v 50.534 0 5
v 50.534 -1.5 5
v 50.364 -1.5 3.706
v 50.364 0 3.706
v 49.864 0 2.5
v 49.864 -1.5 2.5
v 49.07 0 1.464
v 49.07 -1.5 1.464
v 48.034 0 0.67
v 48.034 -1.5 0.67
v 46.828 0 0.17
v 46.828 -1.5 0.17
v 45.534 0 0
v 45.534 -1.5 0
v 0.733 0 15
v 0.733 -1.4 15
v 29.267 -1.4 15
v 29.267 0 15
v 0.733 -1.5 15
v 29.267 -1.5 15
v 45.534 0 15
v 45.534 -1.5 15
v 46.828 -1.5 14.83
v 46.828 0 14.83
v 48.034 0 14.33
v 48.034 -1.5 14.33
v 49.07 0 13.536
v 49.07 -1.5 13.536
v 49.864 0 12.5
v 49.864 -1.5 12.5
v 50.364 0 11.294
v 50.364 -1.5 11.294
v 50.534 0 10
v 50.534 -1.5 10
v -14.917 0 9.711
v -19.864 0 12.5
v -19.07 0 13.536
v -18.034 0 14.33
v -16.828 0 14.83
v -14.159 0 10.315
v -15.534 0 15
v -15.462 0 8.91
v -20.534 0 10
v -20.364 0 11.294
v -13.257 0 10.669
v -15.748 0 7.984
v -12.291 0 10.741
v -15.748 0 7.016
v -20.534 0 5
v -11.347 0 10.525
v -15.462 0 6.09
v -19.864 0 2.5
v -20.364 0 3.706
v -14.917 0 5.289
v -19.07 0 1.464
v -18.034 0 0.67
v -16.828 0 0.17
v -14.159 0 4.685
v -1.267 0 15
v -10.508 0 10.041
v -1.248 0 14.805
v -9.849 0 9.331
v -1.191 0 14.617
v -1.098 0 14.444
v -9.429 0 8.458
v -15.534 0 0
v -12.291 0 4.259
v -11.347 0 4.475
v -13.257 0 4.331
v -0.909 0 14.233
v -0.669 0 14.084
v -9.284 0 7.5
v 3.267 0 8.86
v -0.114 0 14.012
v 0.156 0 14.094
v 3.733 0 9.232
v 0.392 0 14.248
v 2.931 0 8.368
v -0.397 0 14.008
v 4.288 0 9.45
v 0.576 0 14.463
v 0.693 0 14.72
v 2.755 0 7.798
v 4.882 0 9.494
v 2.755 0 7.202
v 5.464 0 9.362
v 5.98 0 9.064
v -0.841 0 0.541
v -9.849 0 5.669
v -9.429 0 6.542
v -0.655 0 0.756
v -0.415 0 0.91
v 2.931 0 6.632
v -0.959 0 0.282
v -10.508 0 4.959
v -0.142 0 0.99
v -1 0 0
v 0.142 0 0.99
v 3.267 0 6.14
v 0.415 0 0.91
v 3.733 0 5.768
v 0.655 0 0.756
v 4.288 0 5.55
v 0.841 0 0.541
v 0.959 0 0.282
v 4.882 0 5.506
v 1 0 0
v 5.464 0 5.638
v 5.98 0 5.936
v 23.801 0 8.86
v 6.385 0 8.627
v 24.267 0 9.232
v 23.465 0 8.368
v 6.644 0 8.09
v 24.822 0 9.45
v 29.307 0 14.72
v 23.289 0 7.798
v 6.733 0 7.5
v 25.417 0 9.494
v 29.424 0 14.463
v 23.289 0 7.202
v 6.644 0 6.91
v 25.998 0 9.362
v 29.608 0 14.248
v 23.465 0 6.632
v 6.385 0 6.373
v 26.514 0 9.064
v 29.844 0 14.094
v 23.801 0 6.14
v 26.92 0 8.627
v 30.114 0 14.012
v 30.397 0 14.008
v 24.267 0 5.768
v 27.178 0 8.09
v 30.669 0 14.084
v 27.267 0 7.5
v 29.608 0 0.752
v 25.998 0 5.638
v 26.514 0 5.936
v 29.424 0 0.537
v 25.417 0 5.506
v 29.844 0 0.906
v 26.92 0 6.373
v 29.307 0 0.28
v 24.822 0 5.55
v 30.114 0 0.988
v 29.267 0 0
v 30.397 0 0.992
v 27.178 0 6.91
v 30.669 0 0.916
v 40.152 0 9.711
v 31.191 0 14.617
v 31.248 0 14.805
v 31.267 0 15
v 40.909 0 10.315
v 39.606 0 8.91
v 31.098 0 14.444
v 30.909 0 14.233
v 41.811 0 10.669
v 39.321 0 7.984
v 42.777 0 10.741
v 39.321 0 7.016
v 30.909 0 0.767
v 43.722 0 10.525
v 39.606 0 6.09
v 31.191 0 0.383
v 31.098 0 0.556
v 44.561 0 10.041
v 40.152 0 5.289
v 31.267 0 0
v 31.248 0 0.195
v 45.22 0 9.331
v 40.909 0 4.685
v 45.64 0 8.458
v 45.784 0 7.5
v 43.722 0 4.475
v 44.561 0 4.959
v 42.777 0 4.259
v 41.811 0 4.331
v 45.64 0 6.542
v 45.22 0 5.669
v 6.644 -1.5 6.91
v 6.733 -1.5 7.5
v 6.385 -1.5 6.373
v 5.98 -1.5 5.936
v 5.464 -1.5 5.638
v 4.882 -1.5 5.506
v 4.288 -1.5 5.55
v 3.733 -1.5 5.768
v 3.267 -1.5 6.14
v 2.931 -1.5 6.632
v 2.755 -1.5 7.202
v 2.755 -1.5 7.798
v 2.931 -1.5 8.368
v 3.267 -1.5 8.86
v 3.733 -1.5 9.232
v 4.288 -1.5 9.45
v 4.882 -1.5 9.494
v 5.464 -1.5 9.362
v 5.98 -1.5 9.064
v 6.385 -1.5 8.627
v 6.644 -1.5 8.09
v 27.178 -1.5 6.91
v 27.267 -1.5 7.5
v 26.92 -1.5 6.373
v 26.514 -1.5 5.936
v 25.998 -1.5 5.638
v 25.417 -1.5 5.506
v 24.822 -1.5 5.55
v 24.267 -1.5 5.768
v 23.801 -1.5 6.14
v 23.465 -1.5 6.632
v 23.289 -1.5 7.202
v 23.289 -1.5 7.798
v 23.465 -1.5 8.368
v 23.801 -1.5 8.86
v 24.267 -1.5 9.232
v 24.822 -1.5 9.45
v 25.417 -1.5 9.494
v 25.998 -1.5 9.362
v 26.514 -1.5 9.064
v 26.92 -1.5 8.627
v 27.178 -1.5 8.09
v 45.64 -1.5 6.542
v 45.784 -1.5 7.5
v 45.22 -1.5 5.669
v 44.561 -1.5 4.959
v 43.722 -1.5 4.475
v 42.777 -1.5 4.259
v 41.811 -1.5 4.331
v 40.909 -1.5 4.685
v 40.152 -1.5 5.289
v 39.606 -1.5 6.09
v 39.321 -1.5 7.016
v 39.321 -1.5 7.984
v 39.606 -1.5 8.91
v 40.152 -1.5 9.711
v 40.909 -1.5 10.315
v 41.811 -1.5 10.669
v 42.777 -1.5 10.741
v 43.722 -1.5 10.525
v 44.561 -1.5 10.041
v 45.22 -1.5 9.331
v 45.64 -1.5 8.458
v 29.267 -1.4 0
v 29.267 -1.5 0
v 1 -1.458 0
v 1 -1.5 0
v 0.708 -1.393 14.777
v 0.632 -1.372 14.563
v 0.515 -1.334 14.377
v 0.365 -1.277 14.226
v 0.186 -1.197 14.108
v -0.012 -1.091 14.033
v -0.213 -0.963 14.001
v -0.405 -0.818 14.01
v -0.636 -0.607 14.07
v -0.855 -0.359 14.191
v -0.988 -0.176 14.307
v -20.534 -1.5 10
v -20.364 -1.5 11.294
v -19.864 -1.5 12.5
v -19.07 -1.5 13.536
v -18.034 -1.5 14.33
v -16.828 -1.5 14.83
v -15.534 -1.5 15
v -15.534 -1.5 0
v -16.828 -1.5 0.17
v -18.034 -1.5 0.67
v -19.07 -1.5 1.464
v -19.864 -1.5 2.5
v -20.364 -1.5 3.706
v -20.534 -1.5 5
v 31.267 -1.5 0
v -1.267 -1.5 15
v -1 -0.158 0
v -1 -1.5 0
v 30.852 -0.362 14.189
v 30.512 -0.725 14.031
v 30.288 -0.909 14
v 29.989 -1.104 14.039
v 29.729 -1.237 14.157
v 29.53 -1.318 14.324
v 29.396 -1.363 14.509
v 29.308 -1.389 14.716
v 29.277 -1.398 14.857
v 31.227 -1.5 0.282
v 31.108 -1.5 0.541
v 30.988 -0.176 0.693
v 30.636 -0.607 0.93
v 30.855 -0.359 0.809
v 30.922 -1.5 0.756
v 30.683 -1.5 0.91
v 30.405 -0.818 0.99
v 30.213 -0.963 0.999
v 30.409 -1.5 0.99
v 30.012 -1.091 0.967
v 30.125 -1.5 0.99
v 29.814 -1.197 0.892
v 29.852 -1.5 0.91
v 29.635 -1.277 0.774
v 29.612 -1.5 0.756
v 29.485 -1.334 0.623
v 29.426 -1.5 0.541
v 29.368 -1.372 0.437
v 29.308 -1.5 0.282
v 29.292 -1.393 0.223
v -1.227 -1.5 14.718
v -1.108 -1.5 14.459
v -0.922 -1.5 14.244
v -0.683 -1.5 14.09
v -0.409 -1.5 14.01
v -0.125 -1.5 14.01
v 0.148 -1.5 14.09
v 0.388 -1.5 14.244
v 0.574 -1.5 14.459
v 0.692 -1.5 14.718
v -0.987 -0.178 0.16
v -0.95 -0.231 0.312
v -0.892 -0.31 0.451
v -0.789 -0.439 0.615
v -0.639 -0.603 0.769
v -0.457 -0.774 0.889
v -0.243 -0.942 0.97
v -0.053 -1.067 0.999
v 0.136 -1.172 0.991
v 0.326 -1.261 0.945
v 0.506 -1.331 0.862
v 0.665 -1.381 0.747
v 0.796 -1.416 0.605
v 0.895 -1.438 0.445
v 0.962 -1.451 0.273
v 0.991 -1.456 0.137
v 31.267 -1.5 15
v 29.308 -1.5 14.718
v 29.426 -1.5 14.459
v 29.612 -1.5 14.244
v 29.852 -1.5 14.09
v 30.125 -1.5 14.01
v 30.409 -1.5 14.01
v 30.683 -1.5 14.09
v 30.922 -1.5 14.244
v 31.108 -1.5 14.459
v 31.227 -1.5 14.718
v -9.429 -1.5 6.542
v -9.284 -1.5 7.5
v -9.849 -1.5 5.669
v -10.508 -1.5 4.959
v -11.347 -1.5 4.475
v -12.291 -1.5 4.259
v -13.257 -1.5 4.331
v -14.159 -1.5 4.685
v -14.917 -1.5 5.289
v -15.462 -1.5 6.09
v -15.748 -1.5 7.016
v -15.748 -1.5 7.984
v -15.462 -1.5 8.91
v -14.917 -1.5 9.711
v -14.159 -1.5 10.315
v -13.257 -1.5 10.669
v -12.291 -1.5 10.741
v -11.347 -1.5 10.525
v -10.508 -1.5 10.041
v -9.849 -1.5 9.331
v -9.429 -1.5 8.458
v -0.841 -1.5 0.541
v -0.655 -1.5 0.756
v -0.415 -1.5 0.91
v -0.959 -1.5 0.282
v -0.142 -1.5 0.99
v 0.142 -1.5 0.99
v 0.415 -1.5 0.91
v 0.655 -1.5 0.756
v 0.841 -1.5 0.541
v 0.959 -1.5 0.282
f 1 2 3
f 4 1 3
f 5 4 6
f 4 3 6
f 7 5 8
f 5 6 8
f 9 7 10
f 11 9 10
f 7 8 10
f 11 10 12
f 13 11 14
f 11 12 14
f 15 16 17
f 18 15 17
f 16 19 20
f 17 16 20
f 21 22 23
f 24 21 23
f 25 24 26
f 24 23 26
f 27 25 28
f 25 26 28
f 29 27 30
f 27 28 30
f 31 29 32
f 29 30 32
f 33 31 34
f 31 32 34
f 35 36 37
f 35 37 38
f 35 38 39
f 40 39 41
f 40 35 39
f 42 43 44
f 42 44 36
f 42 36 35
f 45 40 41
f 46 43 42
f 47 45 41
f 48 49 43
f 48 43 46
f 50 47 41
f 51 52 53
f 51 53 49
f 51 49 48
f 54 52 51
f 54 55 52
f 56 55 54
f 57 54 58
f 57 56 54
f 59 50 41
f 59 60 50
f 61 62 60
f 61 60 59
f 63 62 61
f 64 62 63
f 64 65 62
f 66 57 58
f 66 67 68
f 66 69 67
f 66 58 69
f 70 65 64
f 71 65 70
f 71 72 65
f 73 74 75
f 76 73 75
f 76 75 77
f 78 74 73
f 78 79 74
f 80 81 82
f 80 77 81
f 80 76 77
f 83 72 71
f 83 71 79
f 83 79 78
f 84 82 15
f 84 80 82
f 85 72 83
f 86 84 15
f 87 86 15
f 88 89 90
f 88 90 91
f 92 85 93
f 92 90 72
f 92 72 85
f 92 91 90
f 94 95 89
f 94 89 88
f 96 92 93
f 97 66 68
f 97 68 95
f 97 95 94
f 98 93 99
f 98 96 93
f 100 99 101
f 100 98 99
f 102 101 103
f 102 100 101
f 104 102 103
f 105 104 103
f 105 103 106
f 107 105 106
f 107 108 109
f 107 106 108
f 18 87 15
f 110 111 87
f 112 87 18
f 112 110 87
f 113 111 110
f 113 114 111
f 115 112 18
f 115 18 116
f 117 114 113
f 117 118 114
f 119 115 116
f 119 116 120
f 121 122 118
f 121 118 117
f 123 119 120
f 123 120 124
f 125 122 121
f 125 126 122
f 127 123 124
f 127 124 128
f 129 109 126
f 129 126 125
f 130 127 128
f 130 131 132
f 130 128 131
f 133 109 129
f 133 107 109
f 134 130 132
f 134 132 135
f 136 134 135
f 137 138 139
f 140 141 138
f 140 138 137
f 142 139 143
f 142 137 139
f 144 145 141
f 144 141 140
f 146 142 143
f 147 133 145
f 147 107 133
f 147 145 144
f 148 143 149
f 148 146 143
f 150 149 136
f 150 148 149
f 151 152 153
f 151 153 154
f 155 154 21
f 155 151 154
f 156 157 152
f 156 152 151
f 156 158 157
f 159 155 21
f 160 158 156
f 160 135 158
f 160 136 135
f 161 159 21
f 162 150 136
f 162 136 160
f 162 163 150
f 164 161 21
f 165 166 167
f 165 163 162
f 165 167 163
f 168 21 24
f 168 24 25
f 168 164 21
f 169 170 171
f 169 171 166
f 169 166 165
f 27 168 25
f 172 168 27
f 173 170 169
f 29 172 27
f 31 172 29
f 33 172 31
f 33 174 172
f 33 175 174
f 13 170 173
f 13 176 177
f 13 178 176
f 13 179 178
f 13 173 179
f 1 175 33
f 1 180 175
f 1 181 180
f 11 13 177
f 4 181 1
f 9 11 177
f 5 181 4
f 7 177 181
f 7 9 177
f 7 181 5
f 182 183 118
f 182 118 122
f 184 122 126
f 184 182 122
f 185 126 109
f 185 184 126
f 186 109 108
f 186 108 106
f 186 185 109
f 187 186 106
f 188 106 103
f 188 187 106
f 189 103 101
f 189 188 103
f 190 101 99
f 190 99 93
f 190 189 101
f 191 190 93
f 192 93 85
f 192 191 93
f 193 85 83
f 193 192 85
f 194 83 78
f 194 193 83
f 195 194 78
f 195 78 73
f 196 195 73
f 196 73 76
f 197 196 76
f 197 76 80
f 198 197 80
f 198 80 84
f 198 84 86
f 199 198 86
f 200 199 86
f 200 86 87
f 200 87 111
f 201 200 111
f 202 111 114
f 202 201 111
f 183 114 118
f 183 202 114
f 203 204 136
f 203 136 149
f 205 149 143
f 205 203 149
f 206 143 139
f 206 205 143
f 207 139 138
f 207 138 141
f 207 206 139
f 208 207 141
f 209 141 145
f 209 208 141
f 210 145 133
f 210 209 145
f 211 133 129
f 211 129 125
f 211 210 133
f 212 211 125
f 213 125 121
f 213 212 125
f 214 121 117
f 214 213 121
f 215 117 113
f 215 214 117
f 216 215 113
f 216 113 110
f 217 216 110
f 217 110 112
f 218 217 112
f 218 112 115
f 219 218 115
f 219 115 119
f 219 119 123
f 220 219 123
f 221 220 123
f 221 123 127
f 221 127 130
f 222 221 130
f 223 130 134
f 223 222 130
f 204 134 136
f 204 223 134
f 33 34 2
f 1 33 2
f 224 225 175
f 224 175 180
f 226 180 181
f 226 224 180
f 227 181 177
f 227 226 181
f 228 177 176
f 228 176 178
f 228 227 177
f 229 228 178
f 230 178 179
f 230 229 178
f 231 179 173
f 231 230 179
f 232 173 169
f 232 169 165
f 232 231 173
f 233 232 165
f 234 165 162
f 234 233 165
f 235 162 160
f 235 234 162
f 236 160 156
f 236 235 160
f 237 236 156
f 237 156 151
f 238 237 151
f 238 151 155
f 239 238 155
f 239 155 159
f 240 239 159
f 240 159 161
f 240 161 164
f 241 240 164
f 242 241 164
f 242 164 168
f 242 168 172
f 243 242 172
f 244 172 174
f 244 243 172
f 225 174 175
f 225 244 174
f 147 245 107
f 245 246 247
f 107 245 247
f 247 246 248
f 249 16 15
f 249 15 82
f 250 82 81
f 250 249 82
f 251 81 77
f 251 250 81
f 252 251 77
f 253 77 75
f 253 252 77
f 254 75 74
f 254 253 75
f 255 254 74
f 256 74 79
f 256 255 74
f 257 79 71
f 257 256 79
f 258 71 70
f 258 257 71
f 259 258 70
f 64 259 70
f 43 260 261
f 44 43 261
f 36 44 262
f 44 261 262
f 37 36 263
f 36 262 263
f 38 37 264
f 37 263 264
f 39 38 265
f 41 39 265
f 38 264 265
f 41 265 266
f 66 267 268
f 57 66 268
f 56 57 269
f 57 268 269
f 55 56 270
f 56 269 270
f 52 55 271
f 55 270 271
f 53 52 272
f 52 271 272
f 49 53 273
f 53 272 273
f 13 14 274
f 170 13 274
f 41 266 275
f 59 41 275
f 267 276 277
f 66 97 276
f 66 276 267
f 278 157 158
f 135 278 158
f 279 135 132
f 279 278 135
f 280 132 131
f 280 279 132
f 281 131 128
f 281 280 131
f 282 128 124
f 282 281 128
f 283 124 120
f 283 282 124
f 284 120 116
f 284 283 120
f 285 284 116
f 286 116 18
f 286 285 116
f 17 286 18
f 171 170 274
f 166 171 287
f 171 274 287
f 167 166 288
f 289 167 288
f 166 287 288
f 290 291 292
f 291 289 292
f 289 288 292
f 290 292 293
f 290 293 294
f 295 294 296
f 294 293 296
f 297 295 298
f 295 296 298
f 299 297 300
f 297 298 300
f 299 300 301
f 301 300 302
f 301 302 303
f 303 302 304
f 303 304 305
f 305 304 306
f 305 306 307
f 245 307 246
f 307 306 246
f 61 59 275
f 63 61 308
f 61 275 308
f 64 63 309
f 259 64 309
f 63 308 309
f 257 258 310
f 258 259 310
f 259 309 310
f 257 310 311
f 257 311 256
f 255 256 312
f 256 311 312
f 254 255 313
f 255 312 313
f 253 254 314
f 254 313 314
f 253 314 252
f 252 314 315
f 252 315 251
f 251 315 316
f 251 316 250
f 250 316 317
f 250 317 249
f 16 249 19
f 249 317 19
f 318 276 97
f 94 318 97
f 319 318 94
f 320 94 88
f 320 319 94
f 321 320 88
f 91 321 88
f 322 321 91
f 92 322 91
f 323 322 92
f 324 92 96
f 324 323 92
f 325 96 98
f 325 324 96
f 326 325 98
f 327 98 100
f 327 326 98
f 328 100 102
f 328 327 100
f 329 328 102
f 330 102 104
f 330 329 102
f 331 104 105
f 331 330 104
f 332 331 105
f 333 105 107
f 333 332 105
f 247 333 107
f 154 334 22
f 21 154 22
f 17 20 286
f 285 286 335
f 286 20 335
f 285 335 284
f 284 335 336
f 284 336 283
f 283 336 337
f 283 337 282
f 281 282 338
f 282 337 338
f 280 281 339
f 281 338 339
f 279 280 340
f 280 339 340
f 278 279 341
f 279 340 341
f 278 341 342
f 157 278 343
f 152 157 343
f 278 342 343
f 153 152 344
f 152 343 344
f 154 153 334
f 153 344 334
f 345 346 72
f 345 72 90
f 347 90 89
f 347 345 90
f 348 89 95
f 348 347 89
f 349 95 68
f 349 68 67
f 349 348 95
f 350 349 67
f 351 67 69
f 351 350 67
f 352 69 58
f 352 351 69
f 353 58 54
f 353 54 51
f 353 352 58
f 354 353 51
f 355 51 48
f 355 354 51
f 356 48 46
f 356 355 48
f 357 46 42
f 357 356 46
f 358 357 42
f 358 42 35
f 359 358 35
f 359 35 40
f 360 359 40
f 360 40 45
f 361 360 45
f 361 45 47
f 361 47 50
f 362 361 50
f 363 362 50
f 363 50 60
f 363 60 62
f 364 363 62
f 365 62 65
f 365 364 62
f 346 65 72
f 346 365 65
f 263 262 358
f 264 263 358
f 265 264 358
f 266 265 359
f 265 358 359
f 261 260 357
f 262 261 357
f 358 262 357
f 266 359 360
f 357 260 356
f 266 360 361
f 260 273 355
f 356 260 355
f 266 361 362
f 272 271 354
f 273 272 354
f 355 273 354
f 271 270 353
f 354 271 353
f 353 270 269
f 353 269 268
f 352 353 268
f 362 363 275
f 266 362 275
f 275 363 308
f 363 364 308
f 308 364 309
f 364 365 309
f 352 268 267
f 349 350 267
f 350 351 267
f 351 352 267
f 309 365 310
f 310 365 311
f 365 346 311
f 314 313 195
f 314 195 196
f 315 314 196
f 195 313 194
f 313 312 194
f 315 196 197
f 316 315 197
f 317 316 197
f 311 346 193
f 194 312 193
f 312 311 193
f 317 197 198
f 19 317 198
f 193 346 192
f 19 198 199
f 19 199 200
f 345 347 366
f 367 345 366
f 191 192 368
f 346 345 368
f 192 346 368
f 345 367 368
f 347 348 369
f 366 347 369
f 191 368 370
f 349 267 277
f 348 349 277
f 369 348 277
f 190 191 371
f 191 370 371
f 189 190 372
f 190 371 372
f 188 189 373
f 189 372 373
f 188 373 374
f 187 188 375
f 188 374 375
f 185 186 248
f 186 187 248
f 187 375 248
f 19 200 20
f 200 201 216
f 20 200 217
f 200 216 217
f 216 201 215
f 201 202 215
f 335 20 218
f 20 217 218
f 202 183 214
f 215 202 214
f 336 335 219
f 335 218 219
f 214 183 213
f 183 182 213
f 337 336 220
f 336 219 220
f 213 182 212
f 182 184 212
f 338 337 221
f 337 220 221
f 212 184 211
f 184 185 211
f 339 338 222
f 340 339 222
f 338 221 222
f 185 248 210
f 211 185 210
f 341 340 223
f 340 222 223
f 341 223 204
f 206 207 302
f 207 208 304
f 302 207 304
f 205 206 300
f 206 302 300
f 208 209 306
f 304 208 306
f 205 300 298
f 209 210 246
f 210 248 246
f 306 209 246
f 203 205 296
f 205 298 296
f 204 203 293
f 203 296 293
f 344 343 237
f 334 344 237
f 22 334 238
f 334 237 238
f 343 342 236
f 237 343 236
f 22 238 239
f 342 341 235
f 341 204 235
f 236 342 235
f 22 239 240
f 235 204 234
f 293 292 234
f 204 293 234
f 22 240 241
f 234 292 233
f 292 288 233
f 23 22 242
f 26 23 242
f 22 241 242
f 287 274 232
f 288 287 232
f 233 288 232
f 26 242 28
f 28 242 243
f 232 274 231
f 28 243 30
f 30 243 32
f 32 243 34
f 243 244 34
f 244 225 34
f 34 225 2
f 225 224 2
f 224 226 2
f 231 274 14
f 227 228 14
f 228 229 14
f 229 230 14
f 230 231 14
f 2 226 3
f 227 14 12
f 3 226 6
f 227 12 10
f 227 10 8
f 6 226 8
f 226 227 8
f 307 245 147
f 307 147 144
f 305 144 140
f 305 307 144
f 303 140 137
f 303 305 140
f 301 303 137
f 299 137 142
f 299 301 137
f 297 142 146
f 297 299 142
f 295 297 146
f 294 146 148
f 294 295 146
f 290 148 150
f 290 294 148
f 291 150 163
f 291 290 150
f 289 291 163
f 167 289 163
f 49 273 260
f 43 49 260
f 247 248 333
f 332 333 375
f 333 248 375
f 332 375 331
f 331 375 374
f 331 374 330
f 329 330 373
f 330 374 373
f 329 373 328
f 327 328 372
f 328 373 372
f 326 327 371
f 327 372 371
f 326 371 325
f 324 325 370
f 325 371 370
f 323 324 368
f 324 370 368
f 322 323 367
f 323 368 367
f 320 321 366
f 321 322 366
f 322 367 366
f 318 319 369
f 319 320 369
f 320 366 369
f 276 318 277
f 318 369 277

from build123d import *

# Parameters (mm, degrees)
SM_BASE_FLANGE_2_DEPTH      = 15
SKETCH_26_R                 = 3.25
CUT_EXTRUDE_1_DEPTH         = 42.400483089
FILLET_1_R                  = 5
CUT_EXTRUDE_2_OUTLINE_W     = 33
CUT_EXTRUDE_2_OUTLINE_H     = 15
CUT_EXTRUDE_2_OUTLINE_R     = 2
CUT_EXTRUDE_2_DEPTH         = 20
CUT_EXTRUDE_START           = -1.5
CUT_EXTRUDE_2_2_OUTLINE_R   = 2
CUT_EXTRUDE_2_2_DEPTH       = 1.5
CUT_EXTRUDE_2_3_OUTLINE_R   = 2
CUT_EXTRUDE_2_3_OUTLINE_R_2 = 3.25
CUT_EXTRUDE_2_3_DEPTH       = 1.5


# Read off the part's stored shape, not the designer's step: Вырез-Вытянуть2
# Sheet-metal steps are written as plain solids
with BuildPart() as part:
    # Эскиз1 → Базовая кромка2 (new body)
    with BuildSketch(Plane.XY):
        with BuildLine():
            Line((0, 20), (0, 1.5))
            ThreePointArc((0, 1.5), (0.439339828, 0.439339828), (1.5, 0))
            Line((1.5, 0), (28.5, 0))
            ThreePointArc((28.5, 0), (29.560660172, 0.439339828), (30, 1.5))
            Line((30, 1.5), (30, 20))
            Line((30, 20), (31.5, 20))
            Line((31.5, 20), (31.5, 1.5))
            ThreePointArc((31.5, 1.5), (30.621320344, -0.621320344), (28.5, -1.5))
            Line((28.5, -1.5), (1.5, -1.5))
            ThreePointArc((1.5, -1.5), (-0.621320344, -0.621320344), (-1.5, 1.5))
            Line((-1.5, 1.5), (-1.5, 20))
            Line((-1.5, 20), (0, 20))
        make_face()
    extrude(amount=SM_BASE_FLANGE_2_DEPTH)

    # Эскиз26 → Вырез-Вытянуть1 (cut, through all)
    with BuildSketch(Plane(origin=(31.5, 0, 0), x_dir=(0, 0, -1), z_dir=(1, 0, 0))):
        with Locations((-7.5, 12)):
            Circle(SKETCH_26_R)
    extrude(amount=-CUT_EXTRUDE_1_DEPTH, mode=Mode.SUBTRACT)

    # Скругление1
    fillet_1_edges = [part.edges().sort_by_distance(p)[0] for p in [
        (-0.75, 20, 0),
        (30.75, 20, 0),
        (-0.75, 20, 15),
        (30.75, 20, 15),
    ]]
    fillet(fillet_1_edges, radius=FILLET_1_R)

    # Вырез-Вытянуть2 outline → Вырез-Вытянуть2 (cut)
    with BuildSketch(Plane(origin=(0, 0, 0), x_dir=(1, 0, 0), z_dir=(0, 1, 0))):
        with Locations((15, -7.5)):
            Rectangle(CUT_EXTRUDE_2_OUTLINE_W, CUT_EXTRUDE_2_OUTLINE_H)
        with Locations((25.267145868, -7.5)):
            Circle(CUT_EXTRUDE_2_OUTLINE_R, mode=Mode.SUBTRACT)
        with Locations((4.732854132, -7.5)):
            Circle(CUT_EXTRUDE_2_OUTLINE_R, mode=Mode.SUBTRACT)
    extrude(amount=CUT_EXTRUDE_2_DEPTH, mode=Mode.SUBTRACT)

    # Cut-Extrude 2 2 outline → Cut-Extrude 2 2 (cut)
    with BuildSketch(Plane(origin=(0, 0, 0), x_dir=(1, 0, 0), z_dir=(0, 1, 0)).offset(CUT_EXTRUDE_START)):
        with BuildLine():
            ThreePointArc((31.267145868, -15), (30.267145868, -14), (29.267145868, -15))
            Line((29.267145868, -15), (31.267145868, -15))
        make_face()
        with BuildLine():
            Line((31.267145868, 0), (29.267145868, 0))
            ThreePointArc((29.267145868, 0), (30.267145868, -1), (31.267145868, 0))
        make_face()
        with BuildLine():
            ThreePointArc((0.732854132, -15), (-0.267145868, -14), (-1.267145868, -15))
            Line((-1.267145868, -15), (0.732854132, -15))
        make_face()
        with BuildLine():
            Line((1, 0), (-1, 0))
            ThreePointArc((-1, 0), (0, -1), (1, 0))
        make_face()
        with Locations((25.267145868, -7.5)):
            Circle(CUT_EXTRUDE_2_2_OUTLINE_R)
        with Locations((4.732854132, -7.5)):
            Circle(CUT_EXTRUDE_2_2_OUTLINE_R)
    extrude(amount=CUT_EXTRUDE_2_2_DEPTH, mode=Mode.SUBTRACT)

    # Cut-Extrude 2 3 outline → Cut-Extrude 2 3 (add)
    with BuildSketch(Plane(origin=(0, 0, 0), x_dir=(1, 0, 0), z_dir=(0, 1, 0)).offset(CUT_EXTRUDE_START)):
        with BuildLine():
            Line((31.267145868, -15), (45.534291735, -15))
            ThreePointArc((45.534291735, -15), (49.069825641, -13.535533906), (50.534291735, -10))
            Line((50.534291735, -10), (50.534291735, -5))
            ThreePointArc((50.534291735, -5), (49.069825641, -1.464466094), (45.534291735, 0))
            Line((45.534291735, 0), (31.267145868, 0))
            ThreePointArc((31.267145868, 0), (30.267145868, -1), (29.267145868, 0))
            Line((29.267145868, 0), (1, 0))
            ThreePointArc((1, 0), (0, -1), (-1, 0))
            Line((-1, 0), (-15.534291735, 0))
            ThreePointArc((-15.534291735, 0), (-19.069825641, -1.464466094), (-20.534291735, -5))
            Line((-20.534291735, -5), (-20.534291735, -10))
            ThreePointArc((-20.534291735, -10), (-19.069825641, -13.535533906), (-15.534291735, -15))
            Line((-15.534291735, -15), (-1.267145868, -15))
            ThreePointArc((-1.267145868, -15), (-0.267145868, -14), (0.732854132, -15))
            Line((0.732854132, -15), (29.267145868, -15))
            ThreePointArc((29.267145868, -15), (30.267145868, -14), (31.267145868, -15))
        make_face()
        with Locations((25.267145868, -7.5)):
            Circle(CUT_EXTRUDE_2_3_OUTLINE_R, mode=Mode.SUBTRACT)
        with Locations((4.732854132, -7.5)):
            Circle(CUT_EXTRUDE_2_3_OUTLINE_R, mode=Mode.SUBTRACT)
        with Locations((42.534291735, -7.5)):
            Circle(CUT_EXTRUDE_2_3_OUTLINE_R_2, mode=Mode.SUBTRACT)
        with Locations((-12.534291735, -7.5)):
            Circle(CUT_EXTRUDE_2_3_OUTLINE_R_2, mode=Mode.SUBTRACT)
    extrude(amount=CUT_EXTRUDE_2_3_DEPTH)


solid = part.part
